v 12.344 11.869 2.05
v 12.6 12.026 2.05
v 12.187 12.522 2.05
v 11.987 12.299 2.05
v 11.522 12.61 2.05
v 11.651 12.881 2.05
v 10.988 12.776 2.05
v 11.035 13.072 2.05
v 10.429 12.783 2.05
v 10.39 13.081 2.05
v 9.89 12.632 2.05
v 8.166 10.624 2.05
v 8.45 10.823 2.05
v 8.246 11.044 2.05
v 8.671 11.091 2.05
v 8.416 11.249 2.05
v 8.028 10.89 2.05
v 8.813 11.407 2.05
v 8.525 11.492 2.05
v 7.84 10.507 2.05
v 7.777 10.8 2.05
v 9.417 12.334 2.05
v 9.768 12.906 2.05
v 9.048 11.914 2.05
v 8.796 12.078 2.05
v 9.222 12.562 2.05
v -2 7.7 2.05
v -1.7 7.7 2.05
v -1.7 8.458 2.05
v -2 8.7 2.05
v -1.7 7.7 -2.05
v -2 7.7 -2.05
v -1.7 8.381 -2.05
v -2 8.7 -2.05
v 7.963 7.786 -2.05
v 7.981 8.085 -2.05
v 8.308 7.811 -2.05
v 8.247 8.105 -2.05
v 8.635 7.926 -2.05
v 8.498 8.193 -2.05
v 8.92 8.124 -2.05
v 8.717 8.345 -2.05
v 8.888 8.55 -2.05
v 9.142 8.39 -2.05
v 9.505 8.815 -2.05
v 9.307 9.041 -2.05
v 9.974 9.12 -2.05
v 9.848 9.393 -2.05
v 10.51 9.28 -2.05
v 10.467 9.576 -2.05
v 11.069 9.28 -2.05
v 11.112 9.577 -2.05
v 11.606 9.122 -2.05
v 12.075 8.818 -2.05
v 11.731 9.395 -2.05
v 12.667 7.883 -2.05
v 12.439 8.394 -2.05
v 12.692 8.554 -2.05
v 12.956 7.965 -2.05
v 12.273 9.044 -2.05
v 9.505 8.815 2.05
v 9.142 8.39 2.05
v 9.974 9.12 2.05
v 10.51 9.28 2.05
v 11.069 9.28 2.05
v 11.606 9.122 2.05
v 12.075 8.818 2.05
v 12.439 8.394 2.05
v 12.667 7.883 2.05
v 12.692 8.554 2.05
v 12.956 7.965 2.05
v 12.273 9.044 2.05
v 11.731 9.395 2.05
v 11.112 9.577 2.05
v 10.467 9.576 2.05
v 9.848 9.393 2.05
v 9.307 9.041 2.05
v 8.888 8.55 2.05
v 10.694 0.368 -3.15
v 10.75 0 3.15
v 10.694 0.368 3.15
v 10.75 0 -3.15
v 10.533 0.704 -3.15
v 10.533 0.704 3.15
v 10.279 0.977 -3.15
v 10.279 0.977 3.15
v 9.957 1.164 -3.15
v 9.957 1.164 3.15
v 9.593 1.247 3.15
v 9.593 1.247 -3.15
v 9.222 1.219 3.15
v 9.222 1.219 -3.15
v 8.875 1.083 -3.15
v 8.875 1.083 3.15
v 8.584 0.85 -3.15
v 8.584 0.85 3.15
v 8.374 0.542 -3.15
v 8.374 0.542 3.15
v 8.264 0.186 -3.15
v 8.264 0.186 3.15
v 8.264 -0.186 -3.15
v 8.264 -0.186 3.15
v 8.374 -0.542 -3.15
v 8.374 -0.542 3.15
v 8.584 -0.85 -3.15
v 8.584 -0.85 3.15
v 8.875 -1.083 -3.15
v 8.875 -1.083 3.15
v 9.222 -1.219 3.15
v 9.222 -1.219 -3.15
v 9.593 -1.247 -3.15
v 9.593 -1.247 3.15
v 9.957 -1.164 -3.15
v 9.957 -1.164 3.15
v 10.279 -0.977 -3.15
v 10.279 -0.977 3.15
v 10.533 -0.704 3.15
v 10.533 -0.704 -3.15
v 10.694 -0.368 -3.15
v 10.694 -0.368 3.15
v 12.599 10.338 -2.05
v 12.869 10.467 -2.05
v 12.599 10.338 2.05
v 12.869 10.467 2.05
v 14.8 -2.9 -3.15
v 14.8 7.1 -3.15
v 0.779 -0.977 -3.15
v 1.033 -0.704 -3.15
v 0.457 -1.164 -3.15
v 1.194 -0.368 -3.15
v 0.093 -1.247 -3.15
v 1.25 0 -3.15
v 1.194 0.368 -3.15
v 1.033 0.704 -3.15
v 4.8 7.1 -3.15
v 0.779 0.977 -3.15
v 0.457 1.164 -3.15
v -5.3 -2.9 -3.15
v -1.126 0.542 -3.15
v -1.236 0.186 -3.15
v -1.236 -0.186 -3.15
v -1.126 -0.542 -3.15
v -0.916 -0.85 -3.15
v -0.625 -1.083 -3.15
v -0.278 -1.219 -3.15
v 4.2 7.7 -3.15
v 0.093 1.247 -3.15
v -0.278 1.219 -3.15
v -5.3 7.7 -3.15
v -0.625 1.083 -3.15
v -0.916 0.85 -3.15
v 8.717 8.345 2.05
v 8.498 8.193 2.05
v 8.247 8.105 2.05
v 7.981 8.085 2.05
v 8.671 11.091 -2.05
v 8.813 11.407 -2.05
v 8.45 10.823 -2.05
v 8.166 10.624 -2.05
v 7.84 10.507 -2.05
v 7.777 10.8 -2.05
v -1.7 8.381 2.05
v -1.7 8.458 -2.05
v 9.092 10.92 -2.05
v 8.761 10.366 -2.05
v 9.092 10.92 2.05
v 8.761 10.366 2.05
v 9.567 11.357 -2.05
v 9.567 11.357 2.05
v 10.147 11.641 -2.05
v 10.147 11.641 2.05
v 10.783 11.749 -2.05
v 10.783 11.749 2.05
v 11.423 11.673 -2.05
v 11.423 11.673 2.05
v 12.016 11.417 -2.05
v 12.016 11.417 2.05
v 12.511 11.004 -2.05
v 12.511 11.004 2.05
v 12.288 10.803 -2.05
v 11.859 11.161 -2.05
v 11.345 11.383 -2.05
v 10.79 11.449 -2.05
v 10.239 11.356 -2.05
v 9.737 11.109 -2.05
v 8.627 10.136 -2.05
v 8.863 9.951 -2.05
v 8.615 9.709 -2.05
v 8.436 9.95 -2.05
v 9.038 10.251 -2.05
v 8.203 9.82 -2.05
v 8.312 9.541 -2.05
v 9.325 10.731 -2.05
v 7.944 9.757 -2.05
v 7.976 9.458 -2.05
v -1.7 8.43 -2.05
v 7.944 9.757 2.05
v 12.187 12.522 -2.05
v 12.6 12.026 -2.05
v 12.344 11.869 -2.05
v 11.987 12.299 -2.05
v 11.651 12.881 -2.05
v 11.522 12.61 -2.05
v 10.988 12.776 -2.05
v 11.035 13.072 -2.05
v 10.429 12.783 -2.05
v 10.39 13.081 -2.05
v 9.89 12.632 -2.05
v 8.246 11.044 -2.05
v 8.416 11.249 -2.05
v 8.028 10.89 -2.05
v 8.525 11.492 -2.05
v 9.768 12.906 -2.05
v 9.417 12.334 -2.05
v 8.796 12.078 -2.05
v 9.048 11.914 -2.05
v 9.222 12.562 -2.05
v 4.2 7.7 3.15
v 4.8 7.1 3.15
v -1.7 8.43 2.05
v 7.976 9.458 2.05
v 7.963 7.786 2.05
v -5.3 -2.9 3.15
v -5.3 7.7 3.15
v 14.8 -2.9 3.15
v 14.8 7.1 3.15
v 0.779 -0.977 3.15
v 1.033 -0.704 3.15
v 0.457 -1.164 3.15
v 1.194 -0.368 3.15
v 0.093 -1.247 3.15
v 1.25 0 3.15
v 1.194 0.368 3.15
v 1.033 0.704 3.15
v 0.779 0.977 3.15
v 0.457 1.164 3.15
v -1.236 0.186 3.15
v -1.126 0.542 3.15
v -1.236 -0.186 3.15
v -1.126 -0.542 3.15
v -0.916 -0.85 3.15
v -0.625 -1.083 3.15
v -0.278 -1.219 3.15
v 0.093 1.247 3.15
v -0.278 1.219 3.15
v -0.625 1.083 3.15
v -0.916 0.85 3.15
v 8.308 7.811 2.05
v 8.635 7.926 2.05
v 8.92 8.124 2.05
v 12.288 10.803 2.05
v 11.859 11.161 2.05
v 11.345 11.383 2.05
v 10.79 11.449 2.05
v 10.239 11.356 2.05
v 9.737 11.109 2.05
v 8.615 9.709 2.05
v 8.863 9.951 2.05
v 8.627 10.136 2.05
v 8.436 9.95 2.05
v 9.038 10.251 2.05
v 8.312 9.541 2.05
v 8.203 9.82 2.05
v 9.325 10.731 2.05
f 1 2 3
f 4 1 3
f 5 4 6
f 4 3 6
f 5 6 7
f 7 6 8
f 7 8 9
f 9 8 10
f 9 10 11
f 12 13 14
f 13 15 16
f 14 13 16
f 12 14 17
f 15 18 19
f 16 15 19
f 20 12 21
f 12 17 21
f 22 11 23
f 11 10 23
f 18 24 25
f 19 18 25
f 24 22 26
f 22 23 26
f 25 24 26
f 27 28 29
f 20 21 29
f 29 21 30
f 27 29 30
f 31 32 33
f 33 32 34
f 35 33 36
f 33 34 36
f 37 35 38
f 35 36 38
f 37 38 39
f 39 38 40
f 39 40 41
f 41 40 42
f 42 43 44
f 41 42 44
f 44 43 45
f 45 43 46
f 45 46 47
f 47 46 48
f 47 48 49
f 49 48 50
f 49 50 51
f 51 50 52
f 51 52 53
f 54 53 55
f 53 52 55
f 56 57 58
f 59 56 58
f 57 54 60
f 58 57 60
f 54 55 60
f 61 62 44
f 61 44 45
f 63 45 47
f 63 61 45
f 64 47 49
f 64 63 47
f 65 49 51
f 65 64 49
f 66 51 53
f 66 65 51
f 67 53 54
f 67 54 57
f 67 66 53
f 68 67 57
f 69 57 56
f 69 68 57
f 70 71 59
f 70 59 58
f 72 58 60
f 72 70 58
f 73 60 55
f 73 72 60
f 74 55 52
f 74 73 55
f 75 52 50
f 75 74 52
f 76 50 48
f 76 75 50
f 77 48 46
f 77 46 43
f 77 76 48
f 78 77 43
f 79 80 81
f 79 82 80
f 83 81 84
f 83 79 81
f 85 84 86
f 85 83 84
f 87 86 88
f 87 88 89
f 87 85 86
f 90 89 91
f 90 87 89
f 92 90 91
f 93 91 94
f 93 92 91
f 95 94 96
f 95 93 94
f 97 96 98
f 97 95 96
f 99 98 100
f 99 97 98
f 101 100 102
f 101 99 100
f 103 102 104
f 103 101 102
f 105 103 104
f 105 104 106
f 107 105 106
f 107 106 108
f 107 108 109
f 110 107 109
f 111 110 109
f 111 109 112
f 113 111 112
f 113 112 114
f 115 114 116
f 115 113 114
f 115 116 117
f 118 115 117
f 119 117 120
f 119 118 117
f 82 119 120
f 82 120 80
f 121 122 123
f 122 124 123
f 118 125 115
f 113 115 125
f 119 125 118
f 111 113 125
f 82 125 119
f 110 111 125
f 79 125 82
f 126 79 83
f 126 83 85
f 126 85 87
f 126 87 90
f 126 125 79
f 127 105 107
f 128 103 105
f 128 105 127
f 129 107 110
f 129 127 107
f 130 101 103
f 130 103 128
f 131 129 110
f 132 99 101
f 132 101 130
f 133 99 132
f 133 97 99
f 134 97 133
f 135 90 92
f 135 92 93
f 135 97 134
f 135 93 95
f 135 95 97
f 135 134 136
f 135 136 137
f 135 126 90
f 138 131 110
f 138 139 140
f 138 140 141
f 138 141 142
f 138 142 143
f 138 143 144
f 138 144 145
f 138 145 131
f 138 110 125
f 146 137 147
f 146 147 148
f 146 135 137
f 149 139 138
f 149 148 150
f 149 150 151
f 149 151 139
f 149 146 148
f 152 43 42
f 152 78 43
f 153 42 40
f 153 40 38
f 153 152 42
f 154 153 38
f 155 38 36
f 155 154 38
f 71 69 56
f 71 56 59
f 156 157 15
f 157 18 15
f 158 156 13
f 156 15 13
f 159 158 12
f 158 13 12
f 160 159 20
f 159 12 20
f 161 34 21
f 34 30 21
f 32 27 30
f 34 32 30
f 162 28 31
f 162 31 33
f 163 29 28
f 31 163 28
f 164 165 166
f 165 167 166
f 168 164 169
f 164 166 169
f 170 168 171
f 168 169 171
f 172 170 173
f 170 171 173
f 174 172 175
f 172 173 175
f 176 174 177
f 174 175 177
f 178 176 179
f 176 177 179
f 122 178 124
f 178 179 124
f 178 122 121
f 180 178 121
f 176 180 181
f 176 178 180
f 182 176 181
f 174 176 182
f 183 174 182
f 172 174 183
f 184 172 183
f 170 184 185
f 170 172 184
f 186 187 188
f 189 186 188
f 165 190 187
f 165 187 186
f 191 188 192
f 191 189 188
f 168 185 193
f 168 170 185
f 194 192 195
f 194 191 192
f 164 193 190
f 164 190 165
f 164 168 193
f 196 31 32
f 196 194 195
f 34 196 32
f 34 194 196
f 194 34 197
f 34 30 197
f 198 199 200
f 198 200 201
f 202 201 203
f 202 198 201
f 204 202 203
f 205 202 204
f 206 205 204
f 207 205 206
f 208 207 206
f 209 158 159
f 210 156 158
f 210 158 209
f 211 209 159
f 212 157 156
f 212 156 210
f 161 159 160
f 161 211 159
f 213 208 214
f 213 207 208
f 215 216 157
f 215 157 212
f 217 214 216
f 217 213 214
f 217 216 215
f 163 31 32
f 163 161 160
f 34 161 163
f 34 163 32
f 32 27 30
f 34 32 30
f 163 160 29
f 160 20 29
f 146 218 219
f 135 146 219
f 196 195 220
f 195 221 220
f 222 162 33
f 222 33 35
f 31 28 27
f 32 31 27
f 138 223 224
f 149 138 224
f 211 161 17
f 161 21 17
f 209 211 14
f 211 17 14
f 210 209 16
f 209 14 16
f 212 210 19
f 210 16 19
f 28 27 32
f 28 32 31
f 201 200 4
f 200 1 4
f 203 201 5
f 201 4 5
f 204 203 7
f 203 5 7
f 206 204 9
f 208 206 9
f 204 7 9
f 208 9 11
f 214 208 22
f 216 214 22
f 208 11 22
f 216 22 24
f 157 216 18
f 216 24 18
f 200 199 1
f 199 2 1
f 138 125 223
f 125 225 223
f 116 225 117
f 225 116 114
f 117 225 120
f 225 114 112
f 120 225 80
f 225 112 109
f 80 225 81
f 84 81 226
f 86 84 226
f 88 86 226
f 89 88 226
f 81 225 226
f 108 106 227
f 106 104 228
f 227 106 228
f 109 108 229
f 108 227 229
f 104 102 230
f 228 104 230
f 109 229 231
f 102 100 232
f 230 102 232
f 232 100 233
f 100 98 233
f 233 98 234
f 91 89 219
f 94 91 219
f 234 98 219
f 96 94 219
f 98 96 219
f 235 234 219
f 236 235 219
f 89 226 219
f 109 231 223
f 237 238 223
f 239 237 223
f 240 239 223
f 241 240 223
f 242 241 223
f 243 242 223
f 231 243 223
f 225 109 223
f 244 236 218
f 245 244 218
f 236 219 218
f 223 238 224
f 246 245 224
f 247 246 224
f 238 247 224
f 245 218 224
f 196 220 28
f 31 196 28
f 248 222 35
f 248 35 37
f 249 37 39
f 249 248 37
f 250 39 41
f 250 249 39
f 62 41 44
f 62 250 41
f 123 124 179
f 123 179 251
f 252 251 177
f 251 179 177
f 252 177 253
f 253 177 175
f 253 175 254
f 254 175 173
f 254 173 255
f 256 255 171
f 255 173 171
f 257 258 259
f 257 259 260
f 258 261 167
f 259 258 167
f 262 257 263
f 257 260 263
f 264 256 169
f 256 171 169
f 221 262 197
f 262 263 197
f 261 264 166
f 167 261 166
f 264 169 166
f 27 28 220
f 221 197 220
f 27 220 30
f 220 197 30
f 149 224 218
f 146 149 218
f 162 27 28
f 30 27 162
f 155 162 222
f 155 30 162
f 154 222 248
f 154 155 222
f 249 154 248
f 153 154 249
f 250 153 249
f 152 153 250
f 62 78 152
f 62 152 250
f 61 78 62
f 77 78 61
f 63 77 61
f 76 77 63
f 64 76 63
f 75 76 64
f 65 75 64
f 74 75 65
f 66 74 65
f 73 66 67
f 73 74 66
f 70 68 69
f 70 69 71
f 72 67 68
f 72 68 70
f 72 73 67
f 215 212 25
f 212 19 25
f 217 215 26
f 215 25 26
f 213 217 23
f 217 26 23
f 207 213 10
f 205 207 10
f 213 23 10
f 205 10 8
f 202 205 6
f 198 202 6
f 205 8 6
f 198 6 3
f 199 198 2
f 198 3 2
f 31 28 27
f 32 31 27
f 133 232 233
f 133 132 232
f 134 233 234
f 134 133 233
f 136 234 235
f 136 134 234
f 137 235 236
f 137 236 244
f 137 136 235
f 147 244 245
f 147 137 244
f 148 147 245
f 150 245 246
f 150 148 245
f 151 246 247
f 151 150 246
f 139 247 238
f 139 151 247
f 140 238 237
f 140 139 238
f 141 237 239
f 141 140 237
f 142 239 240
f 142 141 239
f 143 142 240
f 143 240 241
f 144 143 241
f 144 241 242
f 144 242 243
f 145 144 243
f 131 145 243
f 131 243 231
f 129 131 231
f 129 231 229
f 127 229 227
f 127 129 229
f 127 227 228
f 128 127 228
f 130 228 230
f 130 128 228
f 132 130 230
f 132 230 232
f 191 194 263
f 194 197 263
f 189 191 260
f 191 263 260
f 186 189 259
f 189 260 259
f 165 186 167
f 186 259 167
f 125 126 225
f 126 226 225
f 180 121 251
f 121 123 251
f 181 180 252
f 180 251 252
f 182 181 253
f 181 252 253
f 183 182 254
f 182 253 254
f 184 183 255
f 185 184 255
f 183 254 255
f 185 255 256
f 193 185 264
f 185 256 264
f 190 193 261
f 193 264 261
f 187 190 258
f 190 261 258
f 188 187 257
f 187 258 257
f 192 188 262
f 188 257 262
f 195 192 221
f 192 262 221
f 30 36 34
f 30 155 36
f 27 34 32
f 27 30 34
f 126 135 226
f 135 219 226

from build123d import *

# Parameters (mm, degrees)
SKETCH1_R           = 1.25
BOSS_EXTRUDE1_DEPTH = 3.15
BOSS_EXTRUDE2_DEPTH = 2.05
BOSS_EXTRUDE3_DEPTH = 2.05
BOSS_EXTRUDE4_DEPTH = 2.05


with BuildPart() as part:
    # Sketch1 → Boss-Extrude1 (new body, symmetric)
    with BuildSketch(Plane.XY):
        Polygon((4.2, 7.7), (4.8, 7.1), (14.8, 7.1), (14.8, -2.9), (-5.3, -2.9), (-5.3, 7.7), align=None)
        Circle(SKETCH1_R, mode=Mode.SUBTRACT)
        with Locations((9.5, 0)):
            Circle(SKETCH1_R, mode=Mode.SUBTRACT)
    extrude(amount=BOSS_EXTRUDE1_DEPTH, both=True)


with BuildPart() as body_2:
    # Sketch2 → Boss-Extrude2 (new body, symmetric)
    with BuildSketch(Plane.XY):
        with BuildLine():
            Line((-2, 7.7), (-2, 8.7))
            Line((-2, 8.7), (7.777013859, 10.8))
            ThreePointArc((7.777013859, 10.8), (8.246050439, 11.04359695), (8.52540848, 11.492254806))
            ThreePointArc((8.52540848, 11.492254806), (10.389553224, 13.080940147), (12.6, 12.02600802))
            Line((12.6, 12.02600802), (12.344239517, 11.869206951))
            ThreePointArc((12.344239517, 11.869206951), (10.428518978, 12.783481461), (8.812926867, 11.406620832))
            ThreePointArc((8.812926867, 11.406620832), (8.449761413, 10.823365619), (7.840013859, 10.506689584))
            Line((7.840013859, 10.506689584), (-1.7, 8.457594698))
            Line((-1.7, 8.457594698), (-1.7, 7.7))
            Line((-1.7, 7.7), (-2, 7.7))
        make_face()
    extrude(amount=BOSS_EXTRUDE2_DEPTH, both=True)


with BuildPart() as body_3:
    # Sketch3 → Boss-Extrude3 (new body, symmetric)
    with BuildSketch(Plane.XY):
        with BuildLine():
            Line((-2, 7.7), (-2, 8.7))
            Line((-2, 8.7), (7.944007232, 9.756749817))
            ThreePointArc((7.944007232, 9.756749817), (8.436126819, 9.949501207), (8.761261588, 10.366181143))
            ThreePointArc((8.761261588, 10.366181143), (10.782617164, 11.749321908), (12.869425577, 10.467063202))
            Line((12.869425577, 10.467063202), (12.59854918, 10.338121442))
            ThreePointArc((12.59854918, 10.338121442), (10.789981889, 11.44941232), (9.03814039, 10.250690324))
            ThreePointArc((9.03814039, 10.250690324), (8.61546519, 9.709006407), (7.975709726, 9.4584296))
            Line((7.975709726, 9.4584296), (-1.7, 8.430191763))
            Line((-1.7, 8.430191763), (-1.7, 7.7))
            Line((-1.7, 7.7), (-2, 7.7))
        make_face()
    extrude(amount=BOSS_EXTRUDE3_DEPTH, both=True)


with BuildPart() as body_4:
    # Sketch4 → Boss-Extrude4 (new body, symmetric)
    with BuildSketch(Plane.XY):
        with BuildLine():
            Line((-2, 8.7), (-2, 7.7))
            Line((-2, 7.7), (-1.7, 7.7))
            Line((-1.7, 7.7), (-1.7, 8.38095514))
            Line((-1.7, 8.38095514), (7.962646813, 7.785850956))
            ThreePointArc((7.962646813, 7.785850956), (8.635207878, 7.926340826), (9.142221759, 8.390035461))
            ThreePointArc((9.142221759, 8.390035461), (11.069289918, 9.280142968), (12.667436983, 7.88307138))
            Line((12.667436983, 7.88307138), (12.956009676, 7.965082361))
            ThreePointArc((12.956009676, 7.965082361), (11.111993832, 9.57708804), (8.888453648, 8.550040917))
            ThreePointArc((8.888453648, 8.550040917), (8.498442971, 8.193352736), (7.981088305, 8.085283605))
            Line((7.981088305, 8.085283605), (-2, 8.7))
        make_face()
    extrude(amount=BOSS_EXTRUDE4_DEPTH, both=True)


solid = Compound([part.part, body_2.part, body_3.part, body_4.part])
